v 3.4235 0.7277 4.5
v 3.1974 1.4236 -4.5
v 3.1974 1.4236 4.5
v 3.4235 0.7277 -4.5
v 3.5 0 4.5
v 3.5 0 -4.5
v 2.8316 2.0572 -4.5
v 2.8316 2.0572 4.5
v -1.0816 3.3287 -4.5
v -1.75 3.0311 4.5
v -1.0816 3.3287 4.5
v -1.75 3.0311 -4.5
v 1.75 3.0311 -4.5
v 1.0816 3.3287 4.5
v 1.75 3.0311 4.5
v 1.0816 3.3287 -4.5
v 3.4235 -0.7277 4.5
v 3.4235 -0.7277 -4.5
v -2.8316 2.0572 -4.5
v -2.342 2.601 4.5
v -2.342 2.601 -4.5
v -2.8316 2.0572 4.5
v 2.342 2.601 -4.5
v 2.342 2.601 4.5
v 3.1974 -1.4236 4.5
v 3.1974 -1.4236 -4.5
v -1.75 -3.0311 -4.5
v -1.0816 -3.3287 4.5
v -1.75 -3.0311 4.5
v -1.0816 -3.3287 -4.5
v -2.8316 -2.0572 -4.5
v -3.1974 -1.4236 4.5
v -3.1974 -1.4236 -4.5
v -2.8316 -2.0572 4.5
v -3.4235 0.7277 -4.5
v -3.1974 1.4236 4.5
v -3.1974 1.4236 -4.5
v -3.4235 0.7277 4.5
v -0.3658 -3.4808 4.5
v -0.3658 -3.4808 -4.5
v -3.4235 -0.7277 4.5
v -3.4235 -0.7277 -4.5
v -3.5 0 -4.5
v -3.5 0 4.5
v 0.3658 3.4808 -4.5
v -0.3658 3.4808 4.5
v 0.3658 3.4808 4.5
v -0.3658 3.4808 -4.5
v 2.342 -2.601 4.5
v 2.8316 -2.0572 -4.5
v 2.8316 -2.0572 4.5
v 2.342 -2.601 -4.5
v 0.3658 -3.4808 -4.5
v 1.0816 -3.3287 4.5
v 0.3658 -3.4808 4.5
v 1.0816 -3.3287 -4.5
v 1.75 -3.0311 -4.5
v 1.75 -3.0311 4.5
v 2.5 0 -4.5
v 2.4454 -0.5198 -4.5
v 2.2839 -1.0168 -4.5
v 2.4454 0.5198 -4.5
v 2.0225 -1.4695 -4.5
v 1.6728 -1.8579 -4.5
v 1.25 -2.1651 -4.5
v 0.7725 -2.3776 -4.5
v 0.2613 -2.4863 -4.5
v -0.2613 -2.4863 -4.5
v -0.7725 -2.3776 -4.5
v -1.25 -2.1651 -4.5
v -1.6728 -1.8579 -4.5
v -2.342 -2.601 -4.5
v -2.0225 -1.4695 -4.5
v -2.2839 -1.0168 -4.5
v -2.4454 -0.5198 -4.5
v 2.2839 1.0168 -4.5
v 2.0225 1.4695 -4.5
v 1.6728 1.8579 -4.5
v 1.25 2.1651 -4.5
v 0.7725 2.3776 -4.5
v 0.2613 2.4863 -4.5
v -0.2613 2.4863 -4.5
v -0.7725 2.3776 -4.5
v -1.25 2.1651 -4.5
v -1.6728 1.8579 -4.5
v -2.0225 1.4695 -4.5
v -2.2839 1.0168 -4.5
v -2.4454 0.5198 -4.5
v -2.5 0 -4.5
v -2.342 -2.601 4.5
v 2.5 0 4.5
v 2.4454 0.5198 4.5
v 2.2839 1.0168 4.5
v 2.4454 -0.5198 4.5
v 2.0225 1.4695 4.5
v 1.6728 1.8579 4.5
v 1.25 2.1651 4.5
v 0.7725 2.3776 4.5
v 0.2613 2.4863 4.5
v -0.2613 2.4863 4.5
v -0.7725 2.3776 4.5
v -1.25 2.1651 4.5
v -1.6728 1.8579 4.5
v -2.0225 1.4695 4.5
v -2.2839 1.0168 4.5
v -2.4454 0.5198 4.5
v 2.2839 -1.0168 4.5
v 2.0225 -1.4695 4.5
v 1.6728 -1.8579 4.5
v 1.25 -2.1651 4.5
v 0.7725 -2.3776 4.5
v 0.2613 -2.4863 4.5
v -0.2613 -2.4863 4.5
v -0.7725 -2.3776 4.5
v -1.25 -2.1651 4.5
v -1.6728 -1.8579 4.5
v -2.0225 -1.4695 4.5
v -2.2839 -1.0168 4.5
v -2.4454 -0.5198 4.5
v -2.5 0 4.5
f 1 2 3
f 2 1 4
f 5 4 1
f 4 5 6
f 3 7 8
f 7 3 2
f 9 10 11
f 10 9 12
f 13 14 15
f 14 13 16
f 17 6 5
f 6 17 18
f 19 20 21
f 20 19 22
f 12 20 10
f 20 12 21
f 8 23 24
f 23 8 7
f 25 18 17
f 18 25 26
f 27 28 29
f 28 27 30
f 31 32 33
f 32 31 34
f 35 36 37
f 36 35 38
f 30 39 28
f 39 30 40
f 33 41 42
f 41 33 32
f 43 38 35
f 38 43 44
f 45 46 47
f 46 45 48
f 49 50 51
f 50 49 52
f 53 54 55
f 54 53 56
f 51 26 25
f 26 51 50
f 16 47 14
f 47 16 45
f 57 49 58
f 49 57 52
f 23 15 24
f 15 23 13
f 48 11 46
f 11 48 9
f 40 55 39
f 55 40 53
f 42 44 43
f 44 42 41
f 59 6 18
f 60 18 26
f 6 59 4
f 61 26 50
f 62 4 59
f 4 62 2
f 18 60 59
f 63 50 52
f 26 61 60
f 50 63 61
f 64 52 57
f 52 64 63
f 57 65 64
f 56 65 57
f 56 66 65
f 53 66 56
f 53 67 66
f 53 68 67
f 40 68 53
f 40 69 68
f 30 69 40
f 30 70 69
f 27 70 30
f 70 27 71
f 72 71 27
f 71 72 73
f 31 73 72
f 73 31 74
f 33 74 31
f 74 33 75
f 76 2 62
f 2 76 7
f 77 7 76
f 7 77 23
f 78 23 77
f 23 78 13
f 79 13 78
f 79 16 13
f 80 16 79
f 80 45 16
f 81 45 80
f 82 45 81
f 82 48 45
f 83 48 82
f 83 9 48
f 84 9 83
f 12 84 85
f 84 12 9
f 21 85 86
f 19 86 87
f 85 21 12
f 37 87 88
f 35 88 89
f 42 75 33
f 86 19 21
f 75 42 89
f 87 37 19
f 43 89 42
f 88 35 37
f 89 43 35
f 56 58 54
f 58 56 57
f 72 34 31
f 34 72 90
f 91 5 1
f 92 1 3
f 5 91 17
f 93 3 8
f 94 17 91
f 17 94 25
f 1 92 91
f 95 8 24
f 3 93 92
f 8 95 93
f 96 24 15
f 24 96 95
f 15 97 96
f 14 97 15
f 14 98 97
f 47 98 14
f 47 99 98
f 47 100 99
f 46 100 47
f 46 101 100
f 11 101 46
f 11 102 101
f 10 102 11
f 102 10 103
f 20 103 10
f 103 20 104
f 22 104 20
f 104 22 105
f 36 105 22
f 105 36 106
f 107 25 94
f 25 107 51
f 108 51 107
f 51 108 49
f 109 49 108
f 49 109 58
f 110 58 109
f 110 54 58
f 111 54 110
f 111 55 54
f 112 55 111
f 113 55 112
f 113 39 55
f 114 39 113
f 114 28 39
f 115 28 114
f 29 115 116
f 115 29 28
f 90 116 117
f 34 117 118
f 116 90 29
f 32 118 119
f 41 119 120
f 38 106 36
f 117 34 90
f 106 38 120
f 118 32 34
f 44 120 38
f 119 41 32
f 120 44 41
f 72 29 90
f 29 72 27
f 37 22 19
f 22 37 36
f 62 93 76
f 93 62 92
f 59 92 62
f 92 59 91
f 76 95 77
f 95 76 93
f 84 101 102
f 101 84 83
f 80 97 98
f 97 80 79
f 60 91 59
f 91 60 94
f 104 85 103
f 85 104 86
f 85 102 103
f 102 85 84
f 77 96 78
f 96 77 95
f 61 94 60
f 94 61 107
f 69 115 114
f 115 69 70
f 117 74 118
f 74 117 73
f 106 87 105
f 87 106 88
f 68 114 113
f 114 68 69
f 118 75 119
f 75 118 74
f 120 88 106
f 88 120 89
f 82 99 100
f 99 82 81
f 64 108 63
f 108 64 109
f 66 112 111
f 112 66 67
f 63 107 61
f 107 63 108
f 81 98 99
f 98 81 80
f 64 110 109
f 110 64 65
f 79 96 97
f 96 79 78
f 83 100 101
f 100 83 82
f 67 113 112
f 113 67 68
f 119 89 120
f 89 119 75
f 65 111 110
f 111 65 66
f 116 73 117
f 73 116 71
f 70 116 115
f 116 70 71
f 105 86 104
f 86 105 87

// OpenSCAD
height = 9;
inner_diameter = 5;
wall_thickness = 1;
$fs = 0.5;
   
difference() {
   cylinder (h=height, d=inner_diameter + 2*wall_thickness, center=true);
   cylinder (h=height, d=inner_diameter, center=true);
}
